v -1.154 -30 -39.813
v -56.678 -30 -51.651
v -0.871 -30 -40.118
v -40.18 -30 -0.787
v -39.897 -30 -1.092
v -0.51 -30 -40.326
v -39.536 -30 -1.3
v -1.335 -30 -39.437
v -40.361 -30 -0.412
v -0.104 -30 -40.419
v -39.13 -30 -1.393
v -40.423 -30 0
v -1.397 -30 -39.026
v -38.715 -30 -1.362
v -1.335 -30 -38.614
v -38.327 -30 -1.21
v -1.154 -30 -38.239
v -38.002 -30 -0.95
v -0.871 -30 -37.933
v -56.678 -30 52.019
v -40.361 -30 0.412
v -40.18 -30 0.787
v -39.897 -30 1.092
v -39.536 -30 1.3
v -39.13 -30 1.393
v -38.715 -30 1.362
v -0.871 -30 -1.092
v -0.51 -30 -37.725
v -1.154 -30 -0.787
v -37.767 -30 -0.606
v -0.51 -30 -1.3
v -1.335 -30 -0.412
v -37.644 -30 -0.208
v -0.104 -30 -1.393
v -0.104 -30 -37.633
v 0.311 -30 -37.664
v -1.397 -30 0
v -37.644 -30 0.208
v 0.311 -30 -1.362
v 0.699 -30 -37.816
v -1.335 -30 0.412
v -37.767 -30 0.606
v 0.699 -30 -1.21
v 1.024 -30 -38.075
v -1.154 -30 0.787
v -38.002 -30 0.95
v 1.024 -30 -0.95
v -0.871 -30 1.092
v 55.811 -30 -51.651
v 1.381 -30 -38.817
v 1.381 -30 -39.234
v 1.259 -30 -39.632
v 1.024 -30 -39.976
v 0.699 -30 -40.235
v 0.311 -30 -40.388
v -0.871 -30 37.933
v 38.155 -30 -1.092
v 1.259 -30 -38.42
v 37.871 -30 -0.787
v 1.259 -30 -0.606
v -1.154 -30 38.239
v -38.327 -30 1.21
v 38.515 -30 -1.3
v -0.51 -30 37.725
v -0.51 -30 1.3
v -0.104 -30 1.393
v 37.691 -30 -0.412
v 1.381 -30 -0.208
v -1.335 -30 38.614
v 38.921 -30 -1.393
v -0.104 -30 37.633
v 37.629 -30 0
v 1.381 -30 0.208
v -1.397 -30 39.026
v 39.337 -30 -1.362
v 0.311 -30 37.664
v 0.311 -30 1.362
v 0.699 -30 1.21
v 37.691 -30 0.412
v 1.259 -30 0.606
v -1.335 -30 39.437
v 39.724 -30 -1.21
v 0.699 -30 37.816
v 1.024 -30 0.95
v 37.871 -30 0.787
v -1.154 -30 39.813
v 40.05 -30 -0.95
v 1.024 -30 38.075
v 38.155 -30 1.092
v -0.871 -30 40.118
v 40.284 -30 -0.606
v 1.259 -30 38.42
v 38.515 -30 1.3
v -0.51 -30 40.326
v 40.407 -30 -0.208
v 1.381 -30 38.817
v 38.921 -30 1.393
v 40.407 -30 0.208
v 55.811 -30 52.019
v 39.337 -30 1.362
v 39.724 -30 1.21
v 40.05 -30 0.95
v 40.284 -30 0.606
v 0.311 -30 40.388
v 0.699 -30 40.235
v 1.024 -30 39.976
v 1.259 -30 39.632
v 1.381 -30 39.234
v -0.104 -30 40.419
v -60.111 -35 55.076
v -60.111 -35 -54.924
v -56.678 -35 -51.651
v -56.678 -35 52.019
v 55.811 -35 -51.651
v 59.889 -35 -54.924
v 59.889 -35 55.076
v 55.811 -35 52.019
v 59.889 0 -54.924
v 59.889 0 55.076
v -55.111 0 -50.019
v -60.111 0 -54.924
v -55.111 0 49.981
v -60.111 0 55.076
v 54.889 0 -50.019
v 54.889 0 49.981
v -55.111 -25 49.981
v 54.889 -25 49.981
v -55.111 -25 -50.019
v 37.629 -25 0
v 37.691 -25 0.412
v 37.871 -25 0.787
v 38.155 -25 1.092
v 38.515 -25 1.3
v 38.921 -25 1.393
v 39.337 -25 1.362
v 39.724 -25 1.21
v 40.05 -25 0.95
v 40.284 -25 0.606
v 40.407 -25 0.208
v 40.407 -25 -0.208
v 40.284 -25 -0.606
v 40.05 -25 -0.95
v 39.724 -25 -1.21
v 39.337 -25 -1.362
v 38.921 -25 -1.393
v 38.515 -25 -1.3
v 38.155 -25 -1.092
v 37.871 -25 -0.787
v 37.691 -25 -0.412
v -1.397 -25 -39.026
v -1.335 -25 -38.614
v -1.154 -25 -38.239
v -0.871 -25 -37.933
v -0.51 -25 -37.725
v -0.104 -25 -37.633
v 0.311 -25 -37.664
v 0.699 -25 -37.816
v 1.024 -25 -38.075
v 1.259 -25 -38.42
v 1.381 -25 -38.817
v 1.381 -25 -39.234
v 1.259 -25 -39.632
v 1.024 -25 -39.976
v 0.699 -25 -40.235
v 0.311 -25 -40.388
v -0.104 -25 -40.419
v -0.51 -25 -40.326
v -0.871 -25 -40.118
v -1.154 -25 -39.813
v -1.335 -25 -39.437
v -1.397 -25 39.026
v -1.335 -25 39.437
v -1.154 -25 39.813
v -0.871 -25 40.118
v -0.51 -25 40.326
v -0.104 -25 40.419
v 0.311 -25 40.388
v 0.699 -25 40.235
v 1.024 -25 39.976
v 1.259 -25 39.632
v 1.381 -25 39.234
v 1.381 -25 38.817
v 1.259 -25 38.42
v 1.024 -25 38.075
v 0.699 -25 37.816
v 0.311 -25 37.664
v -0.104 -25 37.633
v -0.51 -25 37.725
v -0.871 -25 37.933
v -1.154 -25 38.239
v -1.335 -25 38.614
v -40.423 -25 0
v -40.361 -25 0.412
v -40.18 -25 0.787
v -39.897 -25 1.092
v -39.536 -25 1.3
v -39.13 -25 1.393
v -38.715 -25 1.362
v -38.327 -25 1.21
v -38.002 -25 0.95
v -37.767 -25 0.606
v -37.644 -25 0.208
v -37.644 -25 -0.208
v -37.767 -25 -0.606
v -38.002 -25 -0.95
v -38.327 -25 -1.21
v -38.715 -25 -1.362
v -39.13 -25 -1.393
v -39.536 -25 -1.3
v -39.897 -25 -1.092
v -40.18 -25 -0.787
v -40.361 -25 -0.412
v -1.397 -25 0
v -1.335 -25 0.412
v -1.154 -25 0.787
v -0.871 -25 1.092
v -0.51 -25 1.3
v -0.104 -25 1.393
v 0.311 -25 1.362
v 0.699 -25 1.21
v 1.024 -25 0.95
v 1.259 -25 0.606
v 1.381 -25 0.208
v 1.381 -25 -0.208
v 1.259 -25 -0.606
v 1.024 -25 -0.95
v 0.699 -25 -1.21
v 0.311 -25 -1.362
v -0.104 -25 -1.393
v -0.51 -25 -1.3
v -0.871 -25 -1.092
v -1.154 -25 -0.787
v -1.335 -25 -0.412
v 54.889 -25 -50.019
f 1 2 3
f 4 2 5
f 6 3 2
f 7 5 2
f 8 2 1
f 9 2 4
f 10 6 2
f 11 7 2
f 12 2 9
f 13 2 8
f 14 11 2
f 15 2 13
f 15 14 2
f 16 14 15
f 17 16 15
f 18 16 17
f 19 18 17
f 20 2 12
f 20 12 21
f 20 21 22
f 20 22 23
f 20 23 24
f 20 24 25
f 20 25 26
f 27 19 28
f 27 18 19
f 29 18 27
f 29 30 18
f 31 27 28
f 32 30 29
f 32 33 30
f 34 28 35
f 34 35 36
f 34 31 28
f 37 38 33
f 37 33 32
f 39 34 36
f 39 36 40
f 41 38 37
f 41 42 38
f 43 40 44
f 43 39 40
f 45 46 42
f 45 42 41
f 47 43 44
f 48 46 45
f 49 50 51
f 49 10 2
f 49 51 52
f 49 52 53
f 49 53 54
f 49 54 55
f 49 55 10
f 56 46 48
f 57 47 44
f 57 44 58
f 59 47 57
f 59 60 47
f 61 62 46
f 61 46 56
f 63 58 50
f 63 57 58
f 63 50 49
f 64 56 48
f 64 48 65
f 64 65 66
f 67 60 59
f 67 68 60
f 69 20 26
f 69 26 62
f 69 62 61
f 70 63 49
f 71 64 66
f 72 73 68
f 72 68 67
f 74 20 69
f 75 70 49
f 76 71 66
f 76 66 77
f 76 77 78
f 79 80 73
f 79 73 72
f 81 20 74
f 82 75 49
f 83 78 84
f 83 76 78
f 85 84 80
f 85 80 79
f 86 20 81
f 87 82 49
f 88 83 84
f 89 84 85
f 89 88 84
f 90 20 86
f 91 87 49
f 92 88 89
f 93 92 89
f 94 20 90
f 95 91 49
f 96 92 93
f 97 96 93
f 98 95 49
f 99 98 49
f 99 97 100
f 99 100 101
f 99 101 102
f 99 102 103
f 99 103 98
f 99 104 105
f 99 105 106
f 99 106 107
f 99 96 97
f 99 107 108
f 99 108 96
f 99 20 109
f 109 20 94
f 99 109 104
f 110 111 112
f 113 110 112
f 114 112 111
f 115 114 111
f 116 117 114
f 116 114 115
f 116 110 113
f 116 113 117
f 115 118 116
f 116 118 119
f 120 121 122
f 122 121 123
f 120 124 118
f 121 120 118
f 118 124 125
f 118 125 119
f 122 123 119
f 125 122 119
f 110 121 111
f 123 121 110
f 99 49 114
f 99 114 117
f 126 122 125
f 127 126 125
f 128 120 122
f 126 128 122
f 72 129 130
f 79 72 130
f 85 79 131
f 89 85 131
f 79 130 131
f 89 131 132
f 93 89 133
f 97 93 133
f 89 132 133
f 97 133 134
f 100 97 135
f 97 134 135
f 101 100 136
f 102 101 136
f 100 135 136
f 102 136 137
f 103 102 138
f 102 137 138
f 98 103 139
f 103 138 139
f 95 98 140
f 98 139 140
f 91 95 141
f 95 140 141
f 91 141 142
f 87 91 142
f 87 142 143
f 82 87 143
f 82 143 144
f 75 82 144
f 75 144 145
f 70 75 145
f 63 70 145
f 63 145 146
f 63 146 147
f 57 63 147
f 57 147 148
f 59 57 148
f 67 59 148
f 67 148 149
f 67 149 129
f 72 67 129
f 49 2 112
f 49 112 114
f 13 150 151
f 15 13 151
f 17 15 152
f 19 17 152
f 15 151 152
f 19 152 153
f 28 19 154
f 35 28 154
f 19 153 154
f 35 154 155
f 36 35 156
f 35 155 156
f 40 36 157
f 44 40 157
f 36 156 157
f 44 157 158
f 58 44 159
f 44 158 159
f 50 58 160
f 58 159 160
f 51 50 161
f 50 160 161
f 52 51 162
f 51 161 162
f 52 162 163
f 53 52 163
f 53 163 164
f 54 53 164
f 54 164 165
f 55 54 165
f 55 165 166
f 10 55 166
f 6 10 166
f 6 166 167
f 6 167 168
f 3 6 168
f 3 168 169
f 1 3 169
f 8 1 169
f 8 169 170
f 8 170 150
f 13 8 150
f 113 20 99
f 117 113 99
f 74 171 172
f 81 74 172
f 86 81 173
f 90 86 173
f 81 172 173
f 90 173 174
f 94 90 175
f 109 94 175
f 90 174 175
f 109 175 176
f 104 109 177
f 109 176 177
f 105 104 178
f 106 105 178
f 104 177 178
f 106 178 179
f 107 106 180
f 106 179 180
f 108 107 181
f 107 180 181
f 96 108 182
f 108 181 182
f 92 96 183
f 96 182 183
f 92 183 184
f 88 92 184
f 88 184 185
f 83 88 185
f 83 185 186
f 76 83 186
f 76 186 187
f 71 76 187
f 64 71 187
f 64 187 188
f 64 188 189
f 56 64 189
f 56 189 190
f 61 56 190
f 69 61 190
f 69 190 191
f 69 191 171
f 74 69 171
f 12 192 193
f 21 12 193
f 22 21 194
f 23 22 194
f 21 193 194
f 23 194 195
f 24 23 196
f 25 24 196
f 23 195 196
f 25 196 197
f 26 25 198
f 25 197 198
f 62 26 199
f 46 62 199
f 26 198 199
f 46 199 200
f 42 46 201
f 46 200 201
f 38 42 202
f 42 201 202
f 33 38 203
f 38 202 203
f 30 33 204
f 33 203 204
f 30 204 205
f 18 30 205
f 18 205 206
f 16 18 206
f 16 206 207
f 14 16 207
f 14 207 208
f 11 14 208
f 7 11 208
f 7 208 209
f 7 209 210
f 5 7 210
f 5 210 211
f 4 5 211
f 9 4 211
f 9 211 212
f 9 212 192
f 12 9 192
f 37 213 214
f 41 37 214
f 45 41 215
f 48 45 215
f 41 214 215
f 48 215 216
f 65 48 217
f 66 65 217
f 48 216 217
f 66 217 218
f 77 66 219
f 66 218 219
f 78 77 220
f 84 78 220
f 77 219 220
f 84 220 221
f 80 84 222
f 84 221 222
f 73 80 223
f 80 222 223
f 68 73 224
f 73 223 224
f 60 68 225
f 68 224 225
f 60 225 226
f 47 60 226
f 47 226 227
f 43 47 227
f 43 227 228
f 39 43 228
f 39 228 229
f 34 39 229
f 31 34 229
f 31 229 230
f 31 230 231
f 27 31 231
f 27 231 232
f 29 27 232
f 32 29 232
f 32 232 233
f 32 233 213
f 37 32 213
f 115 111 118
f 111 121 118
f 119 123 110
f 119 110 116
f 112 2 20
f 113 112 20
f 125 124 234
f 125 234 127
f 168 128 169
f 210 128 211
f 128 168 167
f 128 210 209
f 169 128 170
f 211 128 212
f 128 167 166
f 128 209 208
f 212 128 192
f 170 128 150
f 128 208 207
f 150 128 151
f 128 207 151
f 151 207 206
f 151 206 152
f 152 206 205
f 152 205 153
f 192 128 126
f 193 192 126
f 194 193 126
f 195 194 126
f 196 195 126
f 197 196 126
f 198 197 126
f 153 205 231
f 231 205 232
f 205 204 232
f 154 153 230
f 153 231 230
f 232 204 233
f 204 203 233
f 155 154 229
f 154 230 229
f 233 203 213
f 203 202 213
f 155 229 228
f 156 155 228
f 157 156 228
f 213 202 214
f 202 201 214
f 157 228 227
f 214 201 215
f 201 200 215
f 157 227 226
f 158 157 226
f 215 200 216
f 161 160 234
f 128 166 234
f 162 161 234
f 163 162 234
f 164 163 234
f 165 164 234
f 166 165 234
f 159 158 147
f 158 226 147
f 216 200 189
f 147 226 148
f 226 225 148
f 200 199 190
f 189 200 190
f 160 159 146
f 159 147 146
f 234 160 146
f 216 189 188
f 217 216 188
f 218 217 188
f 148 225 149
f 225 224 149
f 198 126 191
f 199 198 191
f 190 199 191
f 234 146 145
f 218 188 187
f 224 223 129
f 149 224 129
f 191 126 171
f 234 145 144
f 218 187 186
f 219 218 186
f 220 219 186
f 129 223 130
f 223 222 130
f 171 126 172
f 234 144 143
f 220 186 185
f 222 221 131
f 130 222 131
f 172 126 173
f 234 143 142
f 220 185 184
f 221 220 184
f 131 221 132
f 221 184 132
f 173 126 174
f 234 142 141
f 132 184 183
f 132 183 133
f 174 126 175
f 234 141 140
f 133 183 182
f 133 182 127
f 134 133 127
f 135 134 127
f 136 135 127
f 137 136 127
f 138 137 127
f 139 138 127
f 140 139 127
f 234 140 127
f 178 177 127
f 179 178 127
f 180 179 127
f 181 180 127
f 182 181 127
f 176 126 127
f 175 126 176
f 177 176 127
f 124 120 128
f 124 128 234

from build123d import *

# Parameters (mm, degrees)
F0_W     = 120
F0_H     = 110
F0_W_2   = 110
F0_H_2   = 100
F1_DEPTH = 25
F2_W     = 120
F2_H     = 110
F2_W_2   = 110
F2_H_2   = 100
F3_DEPTH = 5
F4_W     = 120
F4_H     = 110
F4_W_2   = 112.4888285995
F4_H_2   = 103.6703959107
F5_DEPTH = 5
F7_D     = 2.794


with BuildPart() as f1:
    # F0 (on Front) → F1 (new body)
    with BuildSketch(Plane.XZ):
        with Locations((-0.1109875739, 0.0762201769)):
            Rectangle(F0_W, F0_H)
        with Locations((-0.1109875739, -0.0193089247)):
            Rectangle(F0_W_2, F0_H_2, mode=Mode.SUBTRACT)
    extrude(amount=F1_DEPTH)

    # F2 (on face) → F3 (join)
    with BuildSketch(Plane.XZ.offset(25)):
        with Locations((-0.1109875739, 0.0762201769)):
            Rectangle(F2_W, F2_H)
        with Locations((-0.1109875739, -0.0193089247)):
            Rectangle(F2_W_2, F2_H_2, mode=Mode.SUBTRACT)
        with Locations((-0.1109875739, -0.0193089247)):
            Rectangle(F2_W_2, F2_H_2)
    extrude(amount=F3_DEPTH)

    # F4 (on face) → F5 (join)
    with BuildSketch(Plane.XZ.offset(30)):
        with Locations((-0.1109875739, 0.0762201769)):
            Rectangle(F4_W, F4_H)
        with Locations((-0.4336126149, 0.1837611198)):
            Rectangle(F4_W_2, F4_H_2, mode=Mode.SUBTRACT)
    extrude(amount=F5_DEPTH)

    # F7 (through all)
    with Locations(Plane.XZ.offset(30)):
        with Locations((0, 39.025651645), (-39.025651645, 0), (0, -39.025651645), (39.025651645, 0), (0, 0)):
            Hole(F7_D / 2)


solid = f1.part
